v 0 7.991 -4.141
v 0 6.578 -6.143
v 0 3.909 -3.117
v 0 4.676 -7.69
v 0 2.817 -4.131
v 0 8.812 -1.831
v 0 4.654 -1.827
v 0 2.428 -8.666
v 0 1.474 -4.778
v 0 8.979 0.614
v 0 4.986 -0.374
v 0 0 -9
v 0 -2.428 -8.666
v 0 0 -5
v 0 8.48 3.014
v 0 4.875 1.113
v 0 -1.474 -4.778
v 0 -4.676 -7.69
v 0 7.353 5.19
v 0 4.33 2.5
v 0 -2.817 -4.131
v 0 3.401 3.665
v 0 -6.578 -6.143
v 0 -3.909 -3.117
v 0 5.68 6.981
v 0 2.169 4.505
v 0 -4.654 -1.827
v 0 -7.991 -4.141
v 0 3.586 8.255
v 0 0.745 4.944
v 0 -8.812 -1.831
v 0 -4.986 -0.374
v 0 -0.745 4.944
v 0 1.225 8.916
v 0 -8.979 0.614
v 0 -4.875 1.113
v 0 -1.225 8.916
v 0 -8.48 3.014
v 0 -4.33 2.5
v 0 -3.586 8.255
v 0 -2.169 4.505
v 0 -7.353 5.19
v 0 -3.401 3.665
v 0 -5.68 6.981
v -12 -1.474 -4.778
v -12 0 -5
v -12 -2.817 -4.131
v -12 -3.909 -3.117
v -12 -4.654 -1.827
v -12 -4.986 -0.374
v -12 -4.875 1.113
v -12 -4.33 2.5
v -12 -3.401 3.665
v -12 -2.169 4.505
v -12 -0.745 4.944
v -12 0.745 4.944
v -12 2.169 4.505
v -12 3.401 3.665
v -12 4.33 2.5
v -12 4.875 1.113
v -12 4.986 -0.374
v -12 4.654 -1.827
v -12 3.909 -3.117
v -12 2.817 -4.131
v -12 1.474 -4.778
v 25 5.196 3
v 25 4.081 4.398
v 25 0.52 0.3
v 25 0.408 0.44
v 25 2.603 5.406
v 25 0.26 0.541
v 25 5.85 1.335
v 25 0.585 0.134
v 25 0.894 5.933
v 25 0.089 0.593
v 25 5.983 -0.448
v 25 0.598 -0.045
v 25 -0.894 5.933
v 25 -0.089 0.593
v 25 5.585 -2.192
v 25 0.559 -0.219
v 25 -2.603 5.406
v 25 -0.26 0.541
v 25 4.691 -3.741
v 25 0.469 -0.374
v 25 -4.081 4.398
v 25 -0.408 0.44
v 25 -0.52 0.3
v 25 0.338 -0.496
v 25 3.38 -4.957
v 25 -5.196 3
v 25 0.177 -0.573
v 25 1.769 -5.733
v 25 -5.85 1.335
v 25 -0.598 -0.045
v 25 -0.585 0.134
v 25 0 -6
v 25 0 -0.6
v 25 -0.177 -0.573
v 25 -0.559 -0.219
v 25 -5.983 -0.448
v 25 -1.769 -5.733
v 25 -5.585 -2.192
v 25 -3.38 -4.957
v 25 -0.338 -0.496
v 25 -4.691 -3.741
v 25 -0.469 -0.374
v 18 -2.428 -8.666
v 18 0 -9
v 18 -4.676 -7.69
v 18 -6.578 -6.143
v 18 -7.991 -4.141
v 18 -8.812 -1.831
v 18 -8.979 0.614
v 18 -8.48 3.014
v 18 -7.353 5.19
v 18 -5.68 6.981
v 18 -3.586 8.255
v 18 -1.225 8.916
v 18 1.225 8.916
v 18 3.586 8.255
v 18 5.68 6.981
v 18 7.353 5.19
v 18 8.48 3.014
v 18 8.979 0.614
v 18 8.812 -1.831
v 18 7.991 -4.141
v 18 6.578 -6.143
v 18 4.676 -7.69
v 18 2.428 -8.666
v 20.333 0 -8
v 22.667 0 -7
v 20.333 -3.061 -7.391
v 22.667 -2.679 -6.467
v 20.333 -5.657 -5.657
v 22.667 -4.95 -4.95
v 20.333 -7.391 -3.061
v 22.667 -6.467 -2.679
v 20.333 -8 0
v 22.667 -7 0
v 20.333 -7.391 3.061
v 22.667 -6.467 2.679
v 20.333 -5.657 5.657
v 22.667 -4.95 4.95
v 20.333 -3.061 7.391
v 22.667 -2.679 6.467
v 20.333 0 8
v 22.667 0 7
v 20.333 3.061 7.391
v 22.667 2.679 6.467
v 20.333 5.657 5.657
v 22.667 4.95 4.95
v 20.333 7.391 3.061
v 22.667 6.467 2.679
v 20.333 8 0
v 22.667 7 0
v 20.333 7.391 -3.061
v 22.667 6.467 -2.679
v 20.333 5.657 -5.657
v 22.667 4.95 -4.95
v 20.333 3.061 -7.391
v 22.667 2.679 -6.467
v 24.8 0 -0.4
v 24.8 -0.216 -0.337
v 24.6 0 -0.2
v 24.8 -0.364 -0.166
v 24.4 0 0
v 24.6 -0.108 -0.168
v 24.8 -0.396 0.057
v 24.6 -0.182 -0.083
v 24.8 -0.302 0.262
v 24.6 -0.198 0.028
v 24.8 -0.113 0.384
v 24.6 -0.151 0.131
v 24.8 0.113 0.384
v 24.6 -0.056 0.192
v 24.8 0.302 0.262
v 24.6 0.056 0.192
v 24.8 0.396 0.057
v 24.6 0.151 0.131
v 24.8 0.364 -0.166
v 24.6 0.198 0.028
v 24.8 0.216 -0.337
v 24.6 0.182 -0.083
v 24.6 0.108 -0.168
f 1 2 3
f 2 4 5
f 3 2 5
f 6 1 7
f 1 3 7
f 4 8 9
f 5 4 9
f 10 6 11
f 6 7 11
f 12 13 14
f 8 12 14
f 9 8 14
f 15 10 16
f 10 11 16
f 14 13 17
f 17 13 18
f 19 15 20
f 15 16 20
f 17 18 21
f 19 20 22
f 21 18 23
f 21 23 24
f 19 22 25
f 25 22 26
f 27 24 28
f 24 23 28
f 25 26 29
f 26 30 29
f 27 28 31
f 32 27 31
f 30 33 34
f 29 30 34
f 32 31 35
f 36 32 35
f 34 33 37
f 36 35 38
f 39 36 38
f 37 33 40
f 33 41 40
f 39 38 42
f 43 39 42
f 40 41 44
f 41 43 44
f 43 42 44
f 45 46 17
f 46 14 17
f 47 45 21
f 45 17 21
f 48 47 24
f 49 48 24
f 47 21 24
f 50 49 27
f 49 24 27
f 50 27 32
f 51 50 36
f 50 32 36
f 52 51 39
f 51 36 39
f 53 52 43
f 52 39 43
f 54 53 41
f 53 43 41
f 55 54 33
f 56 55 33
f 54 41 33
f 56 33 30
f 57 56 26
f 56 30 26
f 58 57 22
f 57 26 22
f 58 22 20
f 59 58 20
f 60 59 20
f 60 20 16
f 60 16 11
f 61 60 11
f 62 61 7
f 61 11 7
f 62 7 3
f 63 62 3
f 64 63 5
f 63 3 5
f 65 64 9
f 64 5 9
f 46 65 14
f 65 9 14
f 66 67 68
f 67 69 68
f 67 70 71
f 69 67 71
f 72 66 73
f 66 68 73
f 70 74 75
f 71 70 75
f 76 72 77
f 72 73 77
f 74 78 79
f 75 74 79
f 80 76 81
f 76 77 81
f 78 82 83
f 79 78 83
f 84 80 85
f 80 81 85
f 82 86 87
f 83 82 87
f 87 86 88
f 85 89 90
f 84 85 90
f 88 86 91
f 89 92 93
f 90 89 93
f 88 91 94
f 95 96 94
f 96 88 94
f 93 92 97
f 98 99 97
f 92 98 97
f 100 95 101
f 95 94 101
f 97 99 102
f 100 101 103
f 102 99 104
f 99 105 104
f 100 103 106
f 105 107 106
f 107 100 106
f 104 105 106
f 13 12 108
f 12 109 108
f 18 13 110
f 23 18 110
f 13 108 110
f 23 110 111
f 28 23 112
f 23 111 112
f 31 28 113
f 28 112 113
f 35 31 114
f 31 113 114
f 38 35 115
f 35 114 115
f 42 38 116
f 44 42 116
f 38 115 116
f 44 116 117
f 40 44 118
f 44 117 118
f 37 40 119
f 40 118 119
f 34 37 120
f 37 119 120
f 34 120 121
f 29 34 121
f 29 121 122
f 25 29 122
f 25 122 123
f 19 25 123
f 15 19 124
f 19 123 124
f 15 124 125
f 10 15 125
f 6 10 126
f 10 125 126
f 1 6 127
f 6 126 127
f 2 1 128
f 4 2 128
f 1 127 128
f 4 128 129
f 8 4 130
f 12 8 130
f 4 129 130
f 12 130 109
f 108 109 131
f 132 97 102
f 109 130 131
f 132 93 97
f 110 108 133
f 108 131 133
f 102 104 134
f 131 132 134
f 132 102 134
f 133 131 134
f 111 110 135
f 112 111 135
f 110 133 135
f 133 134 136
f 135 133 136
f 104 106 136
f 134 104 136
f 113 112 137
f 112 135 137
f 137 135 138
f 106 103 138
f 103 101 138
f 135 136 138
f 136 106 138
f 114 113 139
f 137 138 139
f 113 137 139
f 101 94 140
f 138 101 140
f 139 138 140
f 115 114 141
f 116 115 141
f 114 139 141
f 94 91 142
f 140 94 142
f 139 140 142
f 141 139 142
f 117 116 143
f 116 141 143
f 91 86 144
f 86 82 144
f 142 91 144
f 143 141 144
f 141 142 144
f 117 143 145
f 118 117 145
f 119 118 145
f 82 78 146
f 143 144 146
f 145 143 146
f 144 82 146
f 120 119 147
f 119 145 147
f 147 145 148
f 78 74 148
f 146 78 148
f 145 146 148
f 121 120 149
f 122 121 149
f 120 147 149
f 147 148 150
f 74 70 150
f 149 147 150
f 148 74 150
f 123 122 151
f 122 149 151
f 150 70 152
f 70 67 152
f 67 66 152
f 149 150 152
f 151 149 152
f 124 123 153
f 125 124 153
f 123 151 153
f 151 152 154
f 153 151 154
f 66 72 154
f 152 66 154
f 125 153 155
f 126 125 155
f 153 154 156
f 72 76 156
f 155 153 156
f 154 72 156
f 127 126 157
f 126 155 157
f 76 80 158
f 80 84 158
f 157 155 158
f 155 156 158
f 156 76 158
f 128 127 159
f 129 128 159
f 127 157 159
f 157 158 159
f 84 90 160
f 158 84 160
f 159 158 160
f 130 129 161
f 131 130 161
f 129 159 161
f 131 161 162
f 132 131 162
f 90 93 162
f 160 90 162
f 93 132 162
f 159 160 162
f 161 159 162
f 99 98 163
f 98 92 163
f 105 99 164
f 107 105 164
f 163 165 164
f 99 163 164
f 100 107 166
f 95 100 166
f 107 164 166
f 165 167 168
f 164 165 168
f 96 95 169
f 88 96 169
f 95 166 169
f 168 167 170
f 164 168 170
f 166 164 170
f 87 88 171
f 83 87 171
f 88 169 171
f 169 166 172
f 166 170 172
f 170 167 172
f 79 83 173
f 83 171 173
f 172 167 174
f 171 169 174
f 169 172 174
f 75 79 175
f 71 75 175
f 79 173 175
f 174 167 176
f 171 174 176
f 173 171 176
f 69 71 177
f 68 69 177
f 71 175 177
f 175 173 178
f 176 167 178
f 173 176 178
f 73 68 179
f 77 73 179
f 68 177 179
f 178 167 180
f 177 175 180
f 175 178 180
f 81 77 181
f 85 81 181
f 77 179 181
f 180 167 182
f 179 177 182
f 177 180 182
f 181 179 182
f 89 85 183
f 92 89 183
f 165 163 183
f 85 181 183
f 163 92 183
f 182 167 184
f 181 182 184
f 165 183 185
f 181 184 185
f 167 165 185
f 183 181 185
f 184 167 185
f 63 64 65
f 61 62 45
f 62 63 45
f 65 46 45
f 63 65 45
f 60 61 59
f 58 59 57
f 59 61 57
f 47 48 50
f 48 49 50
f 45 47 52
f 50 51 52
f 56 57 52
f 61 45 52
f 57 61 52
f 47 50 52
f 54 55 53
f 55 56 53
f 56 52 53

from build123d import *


with BuildPart() as part:
    # 草图1 → 旋转1 (revolve)
    with BuildSketch(Plane.XY, mode=Mode.PRIVATE) as revolve_1_sk:
        Polygon((0, 5), (0, 9), (18, 9), (25, 6), (25, 0), (0, 0), (-12, 0), (-12, 5), align=None)
    revolve(revolve_1_sk.sketch.rotate(Axis((25, 0, 0), (-1, 0, 0)), 90), axis=Axis((25, 0, 0), (-1, 0, 0)))

    # 切除-拉伸1 cone 1 section (through the dimple's axis) → 切除-拉伸1 (revolve, cut)
    with BuildSketch(Plane(origin=(25, 0, 0), x_dir=(0, 0, -1), z_dir=(0, 1, 0))):
        Polygon((0, 0), (0.6, 0), (0, 0.6), align=None)
    revolve(axis=Axis((25, 0, 0), (-1, 0, 0)), mode=Mode.SUBTRACT)


solid = part.part
